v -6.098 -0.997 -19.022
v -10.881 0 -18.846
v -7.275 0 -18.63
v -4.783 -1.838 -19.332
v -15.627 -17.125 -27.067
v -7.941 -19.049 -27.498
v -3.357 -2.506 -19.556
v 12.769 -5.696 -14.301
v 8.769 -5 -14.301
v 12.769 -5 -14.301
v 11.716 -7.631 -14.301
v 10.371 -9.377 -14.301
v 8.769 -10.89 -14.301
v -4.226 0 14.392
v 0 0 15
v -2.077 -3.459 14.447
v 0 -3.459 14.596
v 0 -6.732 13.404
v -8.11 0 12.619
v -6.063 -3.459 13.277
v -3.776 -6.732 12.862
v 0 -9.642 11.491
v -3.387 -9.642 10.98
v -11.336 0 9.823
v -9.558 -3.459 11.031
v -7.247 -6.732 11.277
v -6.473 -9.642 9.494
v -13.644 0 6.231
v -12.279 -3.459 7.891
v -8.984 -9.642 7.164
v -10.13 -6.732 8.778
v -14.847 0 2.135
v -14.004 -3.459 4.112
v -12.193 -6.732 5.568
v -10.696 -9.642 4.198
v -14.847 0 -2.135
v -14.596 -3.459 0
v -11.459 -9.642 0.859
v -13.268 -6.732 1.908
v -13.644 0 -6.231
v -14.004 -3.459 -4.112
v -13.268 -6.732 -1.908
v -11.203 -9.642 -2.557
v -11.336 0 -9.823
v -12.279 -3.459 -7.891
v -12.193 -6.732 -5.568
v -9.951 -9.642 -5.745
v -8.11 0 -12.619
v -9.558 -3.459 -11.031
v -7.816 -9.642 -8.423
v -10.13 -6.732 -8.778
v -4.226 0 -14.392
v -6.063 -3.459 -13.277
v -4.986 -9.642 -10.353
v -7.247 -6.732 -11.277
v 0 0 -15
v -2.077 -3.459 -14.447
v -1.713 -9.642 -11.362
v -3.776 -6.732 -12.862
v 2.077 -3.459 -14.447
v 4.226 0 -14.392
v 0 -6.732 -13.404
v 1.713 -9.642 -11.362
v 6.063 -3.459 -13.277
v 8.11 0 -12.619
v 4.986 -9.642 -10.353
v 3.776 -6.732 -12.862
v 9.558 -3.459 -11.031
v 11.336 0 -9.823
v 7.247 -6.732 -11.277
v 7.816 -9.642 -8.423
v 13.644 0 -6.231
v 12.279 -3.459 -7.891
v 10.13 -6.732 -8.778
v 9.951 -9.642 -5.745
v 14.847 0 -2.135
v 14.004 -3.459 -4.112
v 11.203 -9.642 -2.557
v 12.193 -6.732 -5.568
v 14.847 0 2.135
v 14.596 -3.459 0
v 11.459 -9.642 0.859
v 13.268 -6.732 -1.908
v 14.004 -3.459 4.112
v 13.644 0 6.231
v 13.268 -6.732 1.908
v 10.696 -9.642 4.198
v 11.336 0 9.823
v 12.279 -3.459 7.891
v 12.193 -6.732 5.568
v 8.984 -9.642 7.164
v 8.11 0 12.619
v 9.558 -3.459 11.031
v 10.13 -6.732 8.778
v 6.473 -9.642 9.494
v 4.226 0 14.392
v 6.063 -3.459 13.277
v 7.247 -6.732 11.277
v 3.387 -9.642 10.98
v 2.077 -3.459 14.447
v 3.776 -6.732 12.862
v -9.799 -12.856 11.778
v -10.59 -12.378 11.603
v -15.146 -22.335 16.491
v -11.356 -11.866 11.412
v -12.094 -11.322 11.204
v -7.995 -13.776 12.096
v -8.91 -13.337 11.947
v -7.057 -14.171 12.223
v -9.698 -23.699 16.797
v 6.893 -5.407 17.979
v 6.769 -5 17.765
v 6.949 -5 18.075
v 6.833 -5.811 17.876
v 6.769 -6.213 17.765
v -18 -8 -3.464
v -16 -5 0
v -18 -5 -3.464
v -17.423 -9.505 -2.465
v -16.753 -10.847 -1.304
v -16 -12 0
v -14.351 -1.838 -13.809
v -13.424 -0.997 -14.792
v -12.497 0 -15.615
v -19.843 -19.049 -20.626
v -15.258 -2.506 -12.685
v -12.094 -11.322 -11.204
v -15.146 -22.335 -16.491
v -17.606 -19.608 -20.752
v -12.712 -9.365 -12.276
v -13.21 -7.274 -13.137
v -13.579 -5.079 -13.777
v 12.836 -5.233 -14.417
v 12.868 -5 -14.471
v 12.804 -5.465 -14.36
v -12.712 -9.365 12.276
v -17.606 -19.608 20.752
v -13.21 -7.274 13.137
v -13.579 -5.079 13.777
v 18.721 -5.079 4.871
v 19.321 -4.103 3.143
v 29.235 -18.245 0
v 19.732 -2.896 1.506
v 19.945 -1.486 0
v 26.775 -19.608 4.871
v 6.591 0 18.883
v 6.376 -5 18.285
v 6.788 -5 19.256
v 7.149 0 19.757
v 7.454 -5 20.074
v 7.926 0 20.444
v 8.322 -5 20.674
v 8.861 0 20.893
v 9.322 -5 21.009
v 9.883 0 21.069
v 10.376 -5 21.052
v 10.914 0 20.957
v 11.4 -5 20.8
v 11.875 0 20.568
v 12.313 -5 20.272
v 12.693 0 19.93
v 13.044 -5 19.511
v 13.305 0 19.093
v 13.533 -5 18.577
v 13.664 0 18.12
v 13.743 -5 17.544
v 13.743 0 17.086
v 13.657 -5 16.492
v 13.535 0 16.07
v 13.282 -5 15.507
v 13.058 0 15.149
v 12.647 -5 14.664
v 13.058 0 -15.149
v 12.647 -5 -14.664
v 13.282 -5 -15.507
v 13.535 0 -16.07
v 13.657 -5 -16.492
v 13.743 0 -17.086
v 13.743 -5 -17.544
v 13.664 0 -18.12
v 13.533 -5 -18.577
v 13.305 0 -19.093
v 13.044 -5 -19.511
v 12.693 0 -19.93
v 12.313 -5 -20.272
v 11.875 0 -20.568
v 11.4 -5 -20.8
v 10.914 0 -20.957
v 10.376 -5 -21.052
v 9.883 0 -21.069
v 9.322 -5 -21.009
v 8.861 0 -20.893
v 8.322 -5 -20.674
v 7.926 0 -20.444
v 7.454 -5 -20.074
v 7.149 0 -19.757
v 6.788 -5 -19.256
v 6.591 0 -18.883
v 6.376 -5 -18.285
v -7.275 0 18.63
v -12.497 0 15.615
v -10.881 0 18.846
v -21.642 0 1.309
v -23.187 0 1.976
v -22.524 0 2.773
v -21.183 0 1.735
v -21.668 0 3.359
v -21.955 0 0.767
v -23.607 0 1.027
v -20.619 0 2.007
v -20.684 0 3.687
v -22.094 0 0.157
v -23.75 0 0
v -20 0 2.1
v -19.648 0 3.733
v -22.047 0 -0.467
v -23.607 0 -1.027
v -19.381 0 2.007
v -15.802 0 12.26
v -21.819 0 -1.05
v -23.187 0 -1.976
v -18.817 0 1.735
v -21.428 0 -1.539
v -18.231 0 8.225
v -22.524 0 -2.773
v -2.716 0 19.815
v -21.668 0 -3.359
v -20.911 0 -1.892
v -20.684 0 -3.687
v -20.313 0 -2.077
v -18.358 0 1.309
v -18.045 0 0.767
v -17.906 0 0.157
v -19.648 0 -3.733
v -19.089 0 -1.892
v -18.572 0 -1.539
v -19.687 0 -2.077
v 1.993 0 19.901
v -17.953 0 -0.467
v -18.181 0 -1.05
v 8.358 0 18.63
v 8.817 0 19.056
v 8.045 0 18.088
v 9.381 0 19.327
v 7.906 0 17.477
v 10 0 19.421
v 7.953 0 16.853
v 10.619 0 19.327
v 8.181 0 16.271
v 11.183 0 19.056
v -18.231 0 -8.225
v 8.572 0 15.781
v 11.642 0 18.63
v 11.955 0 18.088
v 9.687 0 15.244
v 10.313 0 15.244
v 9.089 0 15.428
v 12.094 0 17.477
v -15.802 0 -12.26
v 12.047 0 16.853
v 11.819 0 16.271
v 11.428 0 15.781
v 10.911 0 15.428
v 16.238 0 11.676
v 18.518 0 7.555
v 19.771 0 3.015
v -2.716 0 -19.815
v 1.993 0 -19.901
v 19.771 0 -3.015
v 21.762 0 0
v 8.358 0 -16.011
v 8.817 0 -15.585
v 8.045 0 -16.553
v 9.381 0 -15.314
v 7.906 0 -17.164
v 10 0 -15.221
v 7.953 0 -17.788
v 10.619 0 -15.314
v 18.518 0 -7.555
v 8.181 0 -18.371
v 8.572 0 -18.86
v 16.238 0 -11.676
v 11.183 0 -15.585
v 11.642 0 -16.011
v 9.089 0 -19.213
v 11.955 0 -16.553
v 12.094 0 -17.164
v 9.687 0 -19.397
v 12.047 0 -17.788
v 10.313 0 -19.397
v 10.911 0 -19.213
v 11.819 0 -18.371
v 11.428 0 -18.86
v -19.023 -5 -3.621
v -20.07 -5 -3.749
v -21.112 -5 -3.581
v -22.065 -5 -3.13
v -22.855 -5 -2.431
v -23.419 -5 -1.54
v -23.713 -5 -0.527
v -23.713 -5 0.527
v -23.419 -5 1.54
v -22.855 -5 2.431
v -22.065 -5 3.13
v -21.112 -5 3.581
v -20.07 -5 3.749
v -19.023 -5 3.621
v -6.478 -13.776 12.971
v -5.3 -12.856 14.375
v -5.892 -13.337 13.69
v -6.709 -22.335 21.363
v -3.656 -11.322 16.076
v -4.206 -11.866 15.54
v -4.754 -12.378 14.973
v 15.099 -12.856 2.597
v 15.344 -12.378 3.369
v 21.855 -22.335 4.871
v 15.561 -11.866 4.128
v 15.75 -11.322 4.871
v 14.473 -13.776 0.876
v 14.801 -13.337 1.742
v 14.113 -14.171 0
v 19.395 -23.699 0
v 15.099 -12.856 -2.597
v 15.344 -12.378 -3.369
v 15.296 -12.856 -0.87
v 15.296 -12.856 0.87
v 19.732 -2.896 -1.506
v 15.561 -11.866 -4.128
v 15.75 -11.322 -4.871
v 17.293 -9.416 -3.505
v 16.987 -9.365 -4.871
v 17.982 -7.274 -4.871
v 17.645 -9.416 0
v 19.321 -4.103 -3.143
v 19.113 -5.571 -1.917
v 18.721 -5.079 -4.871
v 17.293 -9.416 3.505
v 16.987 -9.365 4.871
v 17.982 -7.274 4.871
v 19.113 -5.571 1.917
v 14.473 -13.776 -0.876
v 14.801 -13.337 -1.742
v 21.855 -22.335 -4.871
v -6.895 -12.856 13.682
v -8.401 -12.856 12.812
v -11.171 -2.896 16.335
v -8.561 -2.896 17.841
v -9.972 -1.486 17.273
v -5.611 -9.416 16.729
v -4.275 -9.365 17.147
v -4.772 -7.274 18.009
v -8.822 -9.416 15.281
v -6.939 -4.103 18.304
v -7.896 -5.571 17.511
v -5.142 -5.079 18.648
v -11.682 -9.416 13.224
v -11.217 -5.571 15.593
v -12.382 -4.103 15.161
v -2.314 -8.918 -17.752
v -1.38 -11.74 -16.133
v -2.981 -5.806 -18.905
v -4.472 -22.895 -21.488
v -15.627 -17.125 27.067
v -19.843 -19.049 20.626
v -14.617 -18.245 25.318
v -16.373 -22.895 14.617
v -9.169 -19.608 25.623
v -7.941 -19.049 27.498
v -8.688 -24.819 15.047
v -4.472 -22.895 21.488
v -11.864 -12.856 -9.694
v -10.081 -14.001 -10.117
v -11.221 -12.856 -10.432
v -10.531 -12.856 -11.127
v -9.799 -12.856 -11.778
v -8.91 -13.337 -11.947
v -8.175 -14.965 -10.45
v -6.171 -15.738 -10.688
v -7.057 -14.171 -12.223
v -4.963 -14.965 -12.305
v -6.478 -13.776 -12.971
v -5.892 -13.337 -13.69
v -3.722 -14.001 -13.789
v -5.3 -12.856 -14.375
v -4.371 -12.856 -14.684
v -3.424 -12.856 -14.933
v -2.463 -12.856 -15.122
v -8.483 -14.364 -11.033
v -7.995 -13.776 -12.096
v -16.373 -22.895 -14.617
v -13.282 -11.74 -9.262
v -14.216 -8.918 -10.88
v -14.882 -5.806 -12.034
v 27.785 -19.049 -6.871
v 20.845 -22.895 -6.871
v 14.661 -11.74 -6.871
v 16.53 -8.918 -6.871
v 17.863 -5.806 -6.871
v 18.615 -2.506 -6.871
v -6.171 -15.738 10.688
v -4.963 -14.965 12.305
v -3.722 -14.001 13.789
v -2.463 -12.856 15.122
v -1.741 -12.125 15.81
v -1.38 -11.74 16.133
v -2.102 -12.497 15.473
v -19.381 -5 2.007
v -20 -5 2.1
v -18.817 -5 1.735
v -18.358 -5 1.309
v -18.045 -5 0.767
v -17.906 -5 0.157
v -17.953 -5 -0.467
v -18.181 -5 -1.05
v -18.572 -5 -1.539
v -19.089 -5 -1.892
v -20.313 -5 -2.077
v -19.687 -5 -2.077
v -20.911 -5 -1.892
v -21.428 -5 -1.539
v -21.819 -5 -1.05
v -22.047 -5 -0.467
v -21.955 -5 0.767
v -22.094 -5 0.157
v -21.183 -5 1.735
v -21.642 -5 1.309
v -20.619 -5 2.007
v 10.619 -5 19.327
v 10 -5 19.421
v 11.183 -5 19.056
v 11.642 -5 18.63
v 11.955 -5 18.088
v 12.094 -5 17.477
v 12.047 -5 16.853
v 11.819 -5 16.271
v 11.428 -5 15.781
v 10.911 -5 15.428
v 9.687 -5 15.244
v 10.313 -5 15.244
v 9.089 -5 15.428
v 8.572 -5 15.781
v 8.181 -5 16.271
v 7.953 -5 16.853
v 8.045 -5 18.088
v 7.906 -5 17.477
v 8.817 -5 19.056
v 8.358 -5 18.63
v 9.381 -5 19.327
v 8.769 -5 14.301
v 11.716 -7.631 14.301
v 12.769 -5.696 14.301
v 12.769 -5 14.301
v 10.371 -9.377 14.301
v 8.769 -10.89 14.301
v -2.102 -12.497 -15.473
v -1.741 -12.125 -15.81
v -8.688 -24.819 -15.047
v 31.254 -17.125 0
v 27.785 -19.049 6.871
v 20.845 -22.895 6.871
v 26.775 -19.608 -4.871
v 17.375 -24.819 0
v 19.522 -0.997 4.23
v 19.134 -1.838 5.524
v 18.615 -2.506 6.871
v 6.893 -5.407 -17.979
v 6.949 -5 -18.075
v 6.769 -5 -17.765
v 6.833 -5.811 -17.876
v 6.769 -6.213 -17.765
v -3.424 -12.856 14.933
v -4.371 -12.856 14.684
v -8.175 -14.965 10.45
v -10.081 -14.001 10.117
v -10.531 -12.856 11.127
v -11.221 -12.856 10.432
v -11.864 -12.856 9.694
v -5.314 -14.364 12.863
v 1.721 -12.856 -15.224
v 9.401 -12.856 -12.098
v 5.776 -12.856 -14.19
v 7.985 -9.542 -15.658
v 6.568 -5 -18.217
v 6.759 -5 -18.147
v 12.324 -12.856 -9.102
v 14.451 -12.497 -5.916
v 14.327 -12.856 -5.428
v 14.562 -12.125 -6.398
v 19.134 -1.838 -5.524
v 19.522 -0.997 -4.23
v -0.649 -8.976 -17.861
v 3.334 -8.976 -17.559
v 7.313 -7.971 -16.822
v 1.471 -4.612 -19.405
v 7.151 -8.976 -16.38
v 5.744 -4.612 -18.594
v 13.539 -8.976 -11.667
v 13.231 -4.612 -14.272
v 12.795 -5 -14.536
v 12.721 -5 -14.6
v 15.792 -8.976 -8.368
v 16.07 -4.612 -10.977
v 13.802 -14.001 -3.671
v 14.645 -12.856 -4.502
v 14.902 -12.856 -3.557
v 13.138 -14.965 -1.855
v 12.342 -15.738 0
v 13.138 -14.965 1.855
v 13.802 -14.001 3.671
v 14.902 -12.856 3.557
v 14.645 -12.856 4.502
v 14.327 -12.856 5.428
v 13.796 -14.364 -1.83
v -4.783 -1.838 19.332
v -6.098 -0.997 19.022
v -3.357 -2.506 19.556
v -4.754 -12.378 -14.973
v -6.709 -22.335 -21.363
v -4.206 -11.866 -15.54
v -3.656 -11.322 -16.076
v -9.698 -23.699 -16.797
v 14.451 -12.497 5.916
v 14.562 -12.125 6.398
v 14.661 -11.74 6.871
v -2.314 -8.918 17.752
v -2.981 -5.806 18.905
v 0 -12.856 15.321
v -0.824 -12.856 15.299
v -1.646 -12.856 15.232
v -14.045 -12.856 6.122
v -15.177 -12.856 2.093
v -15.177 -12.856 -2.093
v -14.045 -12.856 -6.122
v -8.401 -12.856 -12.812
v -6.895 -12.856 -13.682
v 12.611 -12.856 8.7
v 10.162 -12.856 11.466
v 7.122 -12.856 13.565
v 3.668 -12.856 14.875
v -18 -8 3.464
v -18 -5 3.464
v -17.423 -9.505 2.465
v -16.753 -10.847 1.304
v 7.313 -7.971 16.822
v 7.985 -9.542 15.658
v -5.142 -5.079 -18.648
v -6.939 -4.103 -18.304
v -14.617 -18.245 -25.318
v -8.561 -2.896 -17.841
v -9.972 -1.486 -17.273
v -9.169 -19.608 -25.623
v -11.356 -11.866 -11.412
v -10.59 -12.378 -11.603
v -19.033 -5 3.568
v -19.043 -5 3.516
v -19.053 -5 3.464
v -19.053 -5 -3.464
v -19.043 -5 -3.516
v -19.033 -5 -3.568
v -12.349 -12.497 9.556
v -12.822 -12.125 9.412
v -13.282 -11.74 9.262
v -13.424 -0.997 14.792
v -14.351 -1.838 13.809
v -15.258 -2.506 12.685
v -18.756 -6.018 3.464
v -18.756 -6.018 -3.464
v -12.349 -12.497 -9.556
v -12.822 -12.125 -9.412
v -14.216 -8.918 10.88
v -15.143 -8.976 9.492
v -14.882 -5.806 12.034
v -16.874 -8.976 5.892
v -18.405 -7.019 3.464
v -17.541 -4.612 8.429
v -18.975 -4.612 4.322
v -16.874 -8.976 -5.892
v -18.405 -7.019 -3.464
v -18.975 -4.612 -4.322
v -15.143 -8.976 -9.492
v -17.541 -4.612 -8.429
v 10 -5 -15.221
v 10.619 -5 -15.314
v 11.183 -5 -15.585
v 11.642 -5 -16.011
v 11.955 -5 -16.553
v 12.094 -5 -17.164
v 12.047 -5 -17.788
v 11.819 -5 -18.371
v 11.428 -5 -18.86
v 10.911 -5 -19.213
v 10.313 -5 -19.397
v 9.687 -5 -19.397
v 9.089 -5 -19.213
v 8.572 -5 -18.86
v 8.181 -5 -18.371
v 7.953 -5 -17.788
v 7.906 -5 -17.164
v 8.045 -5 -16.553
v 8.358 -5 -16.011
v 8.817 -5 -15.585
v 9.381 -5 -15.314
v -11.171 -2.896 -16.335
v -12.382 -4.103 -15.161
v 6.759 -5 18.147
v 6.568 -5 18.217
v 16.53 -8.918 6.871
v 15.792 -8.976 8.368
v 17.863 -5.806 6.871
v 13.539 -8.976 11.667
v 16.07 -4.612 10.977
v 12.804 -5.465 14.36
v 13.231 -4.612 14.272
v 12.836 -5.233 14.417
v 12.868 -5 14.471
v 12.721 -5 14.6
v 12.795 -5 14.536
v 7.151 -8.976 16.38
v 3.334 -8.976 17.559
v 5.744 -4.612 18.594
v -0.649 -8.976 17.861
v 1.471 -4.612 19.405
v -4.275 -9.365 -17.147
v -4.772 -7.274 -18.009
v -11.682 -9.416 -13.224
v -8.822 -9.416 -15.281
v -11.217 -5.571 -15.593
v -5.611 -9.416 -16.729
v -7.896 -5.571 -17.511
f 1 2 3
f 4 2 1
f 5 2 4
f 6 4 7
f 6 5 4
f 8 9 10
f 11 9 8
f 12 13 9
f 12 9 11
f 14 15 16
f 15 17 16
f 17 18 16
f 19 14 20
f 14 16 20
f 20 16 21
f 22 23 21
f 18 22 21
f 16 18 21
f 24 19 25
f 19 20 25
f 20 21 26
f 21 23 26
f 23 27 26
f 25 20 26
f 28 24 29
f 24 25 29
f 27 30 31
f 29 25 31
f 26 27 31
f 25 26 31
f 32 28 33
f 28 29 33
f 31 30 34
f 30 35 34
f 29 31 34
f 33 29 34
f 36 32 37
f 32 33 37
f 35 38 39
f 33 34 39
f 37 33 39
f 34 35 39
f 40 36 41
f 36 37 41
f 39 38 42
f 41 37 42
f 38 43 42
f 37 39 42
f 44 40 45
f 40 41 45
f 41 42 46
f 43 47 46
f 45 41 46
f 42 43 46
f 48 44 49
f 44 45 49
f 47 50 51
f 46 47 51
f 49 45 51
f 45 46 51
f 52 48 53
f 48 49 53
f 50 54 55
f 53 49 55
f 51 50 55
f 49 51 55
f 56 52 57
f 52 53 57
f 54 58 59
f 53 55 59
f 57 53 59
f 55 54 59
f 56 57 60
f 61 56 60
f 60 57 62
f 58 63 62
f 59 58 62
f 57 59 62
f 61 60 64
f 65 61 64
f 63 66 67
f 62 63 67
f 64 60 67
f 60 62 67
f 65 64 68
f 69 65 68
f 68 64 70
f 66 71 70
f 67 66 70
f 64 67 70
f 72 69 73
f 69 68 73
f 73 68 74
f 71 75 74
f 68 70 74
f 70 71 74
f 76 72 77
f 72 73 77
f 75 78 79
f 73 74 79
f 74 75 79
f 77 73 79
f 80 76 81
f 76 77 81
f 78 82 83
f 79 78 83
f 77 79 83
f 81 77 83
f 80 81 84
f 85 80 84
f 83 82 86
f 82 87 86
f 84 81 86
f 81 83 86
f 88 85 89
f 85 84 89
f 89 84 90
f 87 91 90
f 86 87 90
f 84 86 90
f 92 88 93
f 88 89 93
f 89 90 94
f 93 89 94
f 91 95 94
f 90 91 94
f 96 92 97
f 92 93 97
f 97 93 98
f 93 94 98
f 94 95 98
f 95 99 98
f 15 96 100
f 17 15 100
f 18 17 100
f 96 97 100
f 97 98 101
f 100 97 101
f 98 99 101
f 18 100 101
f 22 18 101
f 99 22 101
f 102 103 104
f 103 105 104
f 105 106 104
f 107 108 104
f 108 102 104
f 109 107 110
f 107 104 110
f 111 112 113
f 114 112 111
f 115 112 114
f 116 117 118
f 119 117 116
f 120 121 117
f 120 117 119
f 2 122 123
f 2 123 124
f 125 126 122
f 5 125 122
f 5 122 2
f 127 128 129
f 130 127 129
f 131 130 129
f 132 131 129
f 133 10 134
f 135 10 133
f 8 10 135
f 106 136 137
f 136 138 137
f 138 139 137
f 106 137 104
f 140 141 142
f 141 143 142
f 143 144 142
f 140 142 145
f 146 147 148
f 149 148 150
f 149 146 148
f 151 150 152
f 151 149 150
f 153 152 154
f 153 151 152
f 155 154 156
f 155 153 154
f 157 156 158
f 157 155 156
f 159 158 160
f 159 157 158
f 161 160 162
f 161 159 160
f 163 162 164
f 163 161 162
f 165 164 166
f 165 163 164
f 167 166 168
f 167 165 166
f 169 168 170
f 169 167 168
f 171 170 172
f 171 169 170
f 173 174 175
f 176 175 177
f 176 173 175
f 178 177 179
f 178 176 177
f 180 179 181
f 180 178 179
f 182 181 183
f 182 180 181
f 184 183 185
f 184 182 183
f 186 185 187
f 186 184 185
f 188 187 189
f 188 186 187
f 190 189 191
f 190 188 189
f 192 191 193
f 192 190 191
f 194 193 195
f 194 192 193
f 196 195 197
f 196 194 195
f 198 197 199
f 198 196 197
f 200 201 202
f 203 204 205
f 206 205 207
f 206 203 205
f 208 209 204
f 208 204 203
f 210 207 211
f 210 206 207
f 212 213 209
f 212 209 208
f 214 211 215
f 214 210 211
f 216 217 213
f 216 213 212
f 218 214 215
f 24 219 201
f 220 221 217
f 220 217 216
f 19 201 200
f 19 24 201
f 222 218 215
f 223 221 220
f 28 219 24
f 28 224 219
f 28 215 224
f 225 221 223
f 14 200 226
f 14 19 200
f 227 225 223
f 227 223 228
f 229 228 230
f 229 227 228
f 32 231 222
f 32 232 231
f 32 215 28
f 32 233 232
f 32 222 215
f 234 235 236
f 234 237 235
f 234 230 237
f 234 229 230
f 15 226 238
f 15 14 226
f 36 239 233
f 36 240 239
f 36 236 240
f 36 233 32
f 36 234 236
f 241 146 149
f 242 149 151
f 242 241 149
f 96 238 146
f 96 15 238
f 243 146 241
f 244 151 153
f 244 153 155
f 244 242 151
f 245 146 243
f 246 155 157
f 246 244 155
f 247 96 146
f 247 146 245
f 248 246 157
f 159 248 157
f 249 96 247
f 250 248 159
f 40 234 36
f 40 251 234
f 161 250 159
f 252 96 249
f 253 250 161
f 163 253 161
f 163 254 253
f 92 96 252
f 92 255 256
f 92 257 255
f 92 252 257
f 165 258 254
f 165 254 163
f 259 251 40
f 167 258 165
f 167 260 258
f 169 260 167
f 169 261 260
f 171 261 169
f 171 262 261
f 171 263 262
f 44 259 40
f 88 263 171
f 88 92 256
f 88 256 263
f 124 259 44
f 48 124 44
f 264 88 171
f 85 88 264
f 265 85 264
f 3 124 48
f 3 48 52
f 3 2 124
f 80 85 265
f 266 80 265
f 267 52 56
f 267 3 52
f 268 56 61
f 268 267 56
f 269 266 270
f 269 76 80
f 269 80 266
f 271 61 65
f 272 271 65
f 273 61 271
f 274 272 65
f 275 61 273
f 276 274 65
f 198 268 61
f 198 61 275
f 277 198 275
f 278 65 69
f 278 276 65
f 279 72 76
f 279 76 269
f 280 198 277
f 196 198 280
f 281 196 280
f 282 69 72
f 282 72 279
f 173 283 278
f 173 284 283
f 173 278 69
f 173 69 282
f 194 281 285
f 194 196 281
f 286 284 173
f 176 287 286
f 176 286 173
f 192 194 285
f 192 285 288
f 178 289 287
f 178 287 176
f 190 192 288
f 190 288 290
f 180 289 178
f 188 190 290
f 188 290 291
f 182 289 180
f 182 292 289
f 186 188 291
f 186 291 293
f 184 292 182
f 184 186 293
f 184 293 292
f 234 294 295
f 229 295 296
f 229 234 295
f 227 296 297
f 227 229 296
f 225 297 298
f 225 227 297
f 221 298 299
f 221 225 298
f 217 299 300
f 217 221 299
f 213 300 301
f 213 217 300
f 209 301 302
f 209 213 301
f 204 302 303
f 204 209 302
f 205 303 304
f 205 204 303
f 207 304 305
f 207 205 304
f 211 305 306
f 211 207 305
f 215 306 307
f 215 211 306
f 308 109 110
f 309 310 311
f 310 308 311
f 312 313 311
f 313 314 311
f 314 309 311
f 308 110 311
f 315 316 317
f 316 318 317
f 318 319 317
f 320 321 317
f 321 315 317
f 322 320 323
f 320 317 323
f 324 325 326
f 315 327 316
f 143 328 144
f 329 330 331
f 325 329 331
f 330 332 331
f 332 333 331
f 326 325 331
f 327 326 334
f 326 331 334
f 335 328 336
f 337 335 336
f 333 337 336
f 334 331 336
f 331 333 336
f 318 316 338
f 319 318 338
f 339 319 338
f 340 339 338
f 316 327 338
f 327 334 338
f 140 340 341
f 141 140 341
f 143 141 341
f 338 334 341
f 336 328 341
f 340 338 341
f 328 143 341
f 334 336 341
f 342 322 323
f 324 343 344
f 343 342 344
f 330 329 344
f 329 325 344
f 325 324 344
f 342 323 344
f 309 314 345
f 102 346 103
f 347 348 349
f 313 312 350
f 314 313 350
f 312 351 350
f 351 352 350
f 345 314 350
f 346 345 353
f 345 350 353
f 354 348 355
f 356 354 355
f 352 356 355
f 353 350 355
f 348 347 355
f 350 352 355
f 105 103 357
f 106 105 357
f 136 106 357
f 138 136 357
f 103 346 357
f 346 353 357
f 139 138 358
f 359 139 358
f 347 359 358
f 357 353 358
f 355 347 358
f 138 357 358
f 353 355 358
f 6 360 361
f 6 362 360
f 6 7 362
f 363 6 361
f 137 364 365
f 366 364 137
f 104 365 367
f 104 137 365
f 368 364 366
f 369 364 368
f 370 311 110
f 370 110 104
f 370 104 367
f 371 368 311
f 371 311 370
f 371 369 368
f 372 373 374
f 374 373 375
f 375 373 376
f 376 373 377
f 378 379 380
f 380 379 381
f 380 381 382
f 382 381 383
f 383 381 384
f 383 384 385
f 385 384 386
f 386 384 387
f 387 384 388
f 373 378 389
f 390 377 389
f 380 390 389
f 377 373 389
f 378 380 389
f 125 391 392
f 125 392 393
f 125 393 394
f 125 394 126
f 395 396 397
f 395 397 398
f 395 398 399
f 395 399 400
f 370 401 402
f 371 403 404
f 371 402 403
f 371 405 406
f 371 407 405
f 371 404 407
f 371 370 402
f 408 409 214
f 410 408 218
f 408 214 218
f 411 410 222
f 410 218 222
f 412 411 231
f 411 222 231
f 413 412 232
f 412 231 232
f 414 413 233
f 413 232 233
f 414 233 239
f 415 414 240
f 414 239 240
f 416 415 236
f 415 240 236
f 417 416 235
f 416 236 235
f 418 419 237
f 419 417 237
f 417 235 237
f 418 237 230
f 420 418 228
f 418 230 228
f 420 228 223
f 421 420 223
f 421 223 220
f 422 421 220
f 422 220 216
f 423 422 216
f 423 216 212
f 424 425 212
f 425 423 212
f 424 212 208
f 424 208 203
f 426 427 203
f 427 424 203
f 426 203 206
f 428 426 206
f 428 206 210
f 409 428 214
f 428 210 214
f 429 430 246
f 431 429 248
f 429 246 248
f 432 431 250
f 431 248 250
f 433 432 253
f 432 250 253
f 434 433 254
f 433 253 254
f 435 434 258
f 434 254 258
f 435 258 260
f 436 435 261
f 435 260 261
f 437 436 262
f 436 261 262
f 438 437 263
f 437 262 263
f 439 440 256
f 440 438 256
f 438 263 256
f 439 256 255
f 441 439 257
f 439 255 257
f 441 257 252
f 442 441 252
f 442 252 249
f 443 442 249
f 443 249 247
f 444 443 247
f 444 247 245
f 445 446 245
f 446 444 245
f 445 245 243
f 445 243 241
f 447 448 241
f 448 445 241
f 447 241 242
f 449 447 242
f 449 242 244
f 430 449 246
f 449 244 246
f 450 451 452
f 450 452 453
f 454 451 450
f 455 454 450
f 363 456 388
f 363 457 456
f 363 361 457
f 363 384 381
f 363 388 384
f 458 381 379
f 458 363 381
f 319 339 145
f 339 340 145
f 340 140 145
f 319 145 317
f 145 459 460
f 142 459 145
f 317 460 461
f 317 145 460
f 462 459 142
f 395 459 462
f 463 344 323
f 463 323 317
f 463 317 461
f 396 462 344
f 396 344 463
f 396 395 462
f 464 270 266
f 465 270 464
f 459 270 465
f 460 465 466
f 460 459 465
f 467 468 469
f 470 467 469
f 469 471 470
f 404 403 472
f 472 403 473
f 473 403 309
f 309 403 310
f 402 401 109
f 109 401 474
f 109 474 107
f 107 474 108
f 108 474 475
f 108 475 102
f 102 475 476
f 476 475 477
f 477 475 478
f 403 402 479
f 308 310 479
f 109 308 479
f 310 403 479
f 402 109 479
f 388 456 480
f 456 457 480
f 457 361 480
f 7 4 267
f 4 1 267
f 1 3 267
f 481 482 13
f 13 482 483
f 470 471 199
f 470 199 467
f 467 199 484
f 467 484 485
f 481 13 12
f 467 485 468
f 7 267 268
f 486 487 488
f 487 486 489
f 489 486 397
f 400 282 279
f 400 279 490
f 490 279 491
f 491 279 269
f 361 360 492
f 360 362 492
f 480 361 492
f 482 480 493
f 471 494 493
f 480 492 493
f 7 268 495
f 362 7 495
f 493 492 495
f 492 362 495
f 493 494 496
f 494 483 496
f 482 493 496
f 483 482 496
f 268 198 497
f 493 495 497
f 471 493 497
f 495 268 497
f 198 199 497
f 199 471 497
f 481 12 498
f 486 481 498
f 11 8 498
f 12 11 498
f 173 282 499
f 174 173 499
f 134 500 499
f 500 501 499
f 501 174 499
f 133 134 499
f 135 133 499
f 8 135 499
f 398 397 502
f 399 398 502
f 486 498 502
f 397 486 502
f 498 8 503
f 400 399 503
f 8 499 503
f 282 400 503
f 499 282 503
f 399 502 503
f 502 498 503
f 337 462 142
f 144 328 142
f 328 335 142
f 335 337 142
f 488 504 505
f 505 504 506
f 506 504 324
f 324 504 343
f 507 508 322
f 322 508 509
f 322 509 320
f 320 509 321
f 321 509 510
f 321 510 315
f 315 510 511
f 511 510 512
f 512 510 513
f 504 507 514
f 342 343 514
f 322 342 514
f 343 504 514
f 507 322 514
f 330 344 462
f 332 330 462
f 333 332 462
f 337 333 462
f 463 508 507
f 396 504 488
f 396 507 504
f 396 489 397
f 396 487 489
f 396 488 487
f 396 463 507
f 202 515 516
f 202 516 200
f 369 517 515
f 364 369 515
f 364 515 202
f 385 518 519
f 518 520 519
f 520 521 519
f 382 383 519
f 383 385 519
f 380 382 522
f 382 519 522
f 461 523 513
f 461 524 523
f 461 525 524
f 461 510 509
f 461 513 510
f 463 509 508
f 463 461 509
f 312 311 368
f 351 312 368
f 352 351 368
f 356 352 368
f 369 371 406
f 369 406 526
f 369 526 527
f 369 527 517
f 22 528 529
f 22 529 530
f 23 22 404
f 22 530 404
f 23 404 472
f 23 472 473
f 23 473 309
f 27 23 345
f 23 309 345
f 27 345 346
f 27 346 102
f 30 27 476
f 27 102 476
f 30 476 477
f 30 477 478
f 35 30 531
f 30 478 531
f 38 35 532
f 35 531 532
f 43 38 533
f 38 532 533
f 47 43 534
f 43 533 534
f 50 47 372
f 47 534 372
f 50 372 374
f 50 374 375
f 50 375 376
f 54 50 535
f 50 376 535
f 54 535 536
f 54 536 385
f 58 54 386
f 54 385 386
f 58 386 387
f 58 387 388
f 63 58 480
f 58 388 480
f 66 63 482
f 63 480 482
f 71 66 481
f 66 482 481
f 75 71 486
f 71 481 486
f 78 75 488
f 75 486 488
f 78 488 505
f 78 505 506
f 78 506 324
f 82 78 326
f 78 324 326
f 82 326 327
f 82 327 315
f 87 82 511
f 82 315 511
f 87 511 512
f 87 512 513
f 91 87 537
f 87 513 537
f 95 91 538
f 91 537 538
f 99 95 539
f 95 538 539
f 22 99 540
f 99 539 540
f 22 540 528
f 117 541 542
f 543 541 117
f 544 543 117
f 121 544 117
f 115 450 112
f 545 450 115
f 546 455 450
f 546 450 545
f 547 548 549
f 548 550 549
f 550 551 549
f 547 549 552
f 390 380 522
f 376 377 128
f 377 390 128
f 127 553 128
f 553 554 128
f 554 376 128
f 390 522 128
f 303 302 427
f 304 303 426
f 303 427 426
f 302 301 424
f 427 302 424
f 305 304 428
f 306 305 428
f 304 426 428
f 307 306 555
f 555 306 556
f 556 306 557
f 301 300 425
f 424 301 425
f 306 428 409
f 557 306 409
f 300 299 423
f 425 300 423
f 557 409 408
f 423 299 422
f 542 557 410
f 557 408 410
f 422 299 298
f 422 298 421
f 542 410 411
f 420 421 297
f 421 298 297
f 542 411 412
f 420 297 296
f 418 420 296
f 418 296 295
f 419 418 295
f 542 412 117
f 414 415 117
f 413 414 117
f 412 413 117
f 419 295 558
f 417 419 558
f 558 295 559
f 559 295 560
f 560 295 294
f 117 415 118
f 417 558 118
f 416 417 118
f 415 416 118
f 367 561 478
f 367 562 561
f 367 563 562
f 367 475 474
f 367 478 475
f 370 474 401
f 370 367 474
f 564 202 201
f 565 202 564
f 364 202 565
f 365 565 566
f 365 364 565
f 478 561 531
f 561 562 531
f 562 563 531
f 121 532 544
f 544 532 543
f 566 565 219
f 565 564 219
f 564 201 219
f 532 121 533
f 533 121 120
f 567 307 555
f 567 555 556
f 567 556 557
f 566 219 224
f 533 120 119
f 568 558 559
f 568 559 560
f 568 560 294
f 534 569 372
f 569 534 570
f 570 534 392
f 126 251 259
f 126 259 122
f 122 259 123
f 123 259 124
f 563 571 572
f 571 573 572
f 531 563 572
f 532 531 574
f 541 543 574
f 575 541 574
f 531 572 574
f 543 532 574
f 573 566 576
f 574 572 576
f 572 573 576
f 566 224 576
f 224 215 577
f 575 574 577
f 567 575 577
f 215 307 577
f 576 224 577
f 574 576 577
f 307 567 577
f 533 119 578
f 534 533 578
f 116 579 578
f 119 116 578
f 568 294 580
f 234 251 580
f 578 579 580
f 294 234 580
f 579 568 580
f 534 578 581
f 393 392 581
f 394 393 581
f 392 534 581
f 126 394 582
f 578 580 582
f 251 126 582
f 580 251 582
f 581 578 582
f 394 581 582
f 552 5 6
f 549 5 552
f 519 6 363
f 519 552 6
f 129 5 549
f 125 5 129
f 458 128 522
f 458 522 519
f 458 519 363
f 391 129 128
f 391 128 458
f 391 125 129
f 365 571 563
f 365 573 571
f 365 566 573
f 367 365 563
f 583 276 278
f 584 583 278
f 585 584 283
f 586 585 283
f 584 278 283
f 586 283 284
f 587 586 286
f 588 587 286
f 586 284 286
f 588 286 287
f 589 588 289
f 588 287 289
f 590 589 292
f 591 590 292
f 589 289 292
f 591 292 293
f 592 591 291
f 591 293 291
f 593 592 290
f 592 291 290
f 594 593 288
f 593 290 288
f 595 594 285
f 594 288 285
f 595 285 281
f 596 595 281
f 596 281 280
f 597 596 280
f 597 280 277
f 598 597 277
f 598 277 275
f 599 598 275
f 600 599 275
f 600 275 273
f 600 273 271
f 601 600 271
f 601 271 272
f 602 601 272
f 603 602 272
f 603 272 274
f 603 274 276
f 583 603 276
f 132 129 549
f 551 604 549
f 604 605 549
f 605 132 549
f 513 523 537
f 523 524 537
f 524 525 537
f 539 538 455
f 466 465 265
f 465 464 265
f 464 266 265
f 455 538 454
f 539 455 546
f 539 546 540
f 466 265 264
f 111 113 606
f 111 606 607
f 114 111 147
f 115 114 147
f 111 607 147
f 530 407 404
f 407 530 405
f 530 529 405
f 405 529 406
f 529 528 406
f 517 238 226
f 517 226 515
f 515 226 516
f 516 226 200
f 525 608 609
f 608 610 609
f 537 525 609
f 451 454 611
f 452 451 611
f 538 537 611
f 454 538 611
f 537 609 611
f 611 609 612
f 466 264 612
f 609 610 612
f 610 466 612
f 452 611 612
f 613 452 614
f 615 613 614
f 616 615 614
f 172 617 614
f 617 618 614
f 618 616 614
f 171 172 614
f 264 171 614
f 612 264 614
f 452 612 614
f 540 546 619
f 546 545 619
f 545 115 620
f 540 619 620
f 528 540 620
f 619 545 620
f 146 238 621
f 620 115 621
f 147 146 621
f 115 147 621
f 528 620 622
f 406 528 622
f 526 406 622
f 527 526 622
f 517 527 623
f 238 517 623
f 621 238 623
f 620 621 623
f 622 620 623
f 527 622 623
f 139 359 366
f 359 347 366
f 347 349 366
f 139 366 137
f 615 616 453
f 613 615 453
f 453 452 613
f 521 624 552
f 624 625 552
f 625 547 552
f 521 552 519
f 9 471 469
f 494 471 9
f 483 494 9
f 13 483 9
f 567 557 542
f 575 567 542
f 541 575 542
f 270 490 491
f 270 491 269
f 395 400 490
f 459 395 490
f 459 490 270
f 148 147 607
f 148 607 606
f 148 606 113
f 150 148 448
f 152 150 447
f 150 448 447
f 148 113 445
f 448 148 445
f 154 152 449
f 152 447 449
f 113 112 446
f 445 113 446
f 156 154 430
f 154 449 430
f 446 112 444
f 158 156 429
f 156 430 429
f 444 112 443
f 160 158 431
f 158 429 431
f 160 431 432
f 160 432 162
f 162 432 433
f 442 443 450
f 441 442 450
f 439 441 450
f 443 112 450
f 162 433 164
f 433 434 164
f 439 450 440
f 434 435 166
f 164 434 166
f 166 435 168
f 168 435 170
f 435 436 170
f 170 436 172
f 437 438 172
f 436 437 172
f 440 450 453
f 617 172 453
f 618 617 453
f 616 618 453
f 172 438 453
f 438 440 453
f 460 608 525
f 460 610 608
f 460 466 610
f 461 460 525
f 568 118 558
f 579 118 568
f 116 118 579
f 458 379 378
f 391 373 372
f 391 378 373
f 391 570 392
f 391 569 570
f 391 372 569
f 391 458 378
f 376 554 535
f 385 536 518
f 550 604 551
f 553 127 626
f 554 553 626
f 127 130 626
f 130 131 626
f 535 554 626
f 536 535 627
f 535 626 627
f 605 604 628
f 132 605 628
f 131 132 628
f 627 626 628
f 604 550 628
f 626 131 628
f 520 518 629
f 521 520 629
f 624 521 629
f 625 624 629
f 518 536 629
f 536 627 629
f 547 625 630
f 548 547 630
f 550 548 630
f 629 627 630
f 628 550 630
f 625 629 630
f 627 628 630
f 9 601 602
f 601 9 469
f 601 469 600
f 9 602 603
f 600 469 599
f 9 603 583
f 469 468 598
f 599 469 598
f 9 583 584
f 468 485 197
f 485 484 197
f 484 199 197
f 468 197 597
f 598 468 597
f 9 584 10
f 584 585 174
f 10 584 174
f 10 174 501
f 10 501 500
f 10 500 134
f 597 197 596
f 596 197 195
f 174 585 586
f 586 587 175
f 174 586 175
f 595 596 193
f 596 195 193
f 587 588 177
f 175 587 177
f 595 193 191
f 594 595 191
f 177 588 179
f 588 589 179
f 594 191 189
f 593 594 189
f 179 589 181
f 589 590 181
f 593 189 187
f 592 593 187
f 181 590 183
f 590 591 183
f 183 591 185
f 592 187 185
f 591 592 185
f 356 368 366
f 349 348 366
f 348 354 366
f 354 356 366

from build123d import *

# Parameters (mm, degrees)
IZIM4_R                          = 3.75
IZIM4_R_2                        = 1.75
Y_KSEKLIK_EKSTR_ZYON1_DEPTH      = 5
IZIM5_R                          = 2.1
KES_EKSTR_ZYON1_DEPTH            = 24
KES_EKSTR_ZYON2_DEPTH            = 36.170331308
Y_KSEKLIK_EKSTR_ZYON2_REACH      = 67.295
Y_KSEKLIK_EKSTR_ZYON2_END_RADIUS = 20
Y_KSEKLIK_EKSTR_ZYON2_START      = -5
DAIRESEL_KAPLAMA1_COUNT          = 3
KES_EKSTR_ZYON3_DEPTH            = 45
KES_EKSTR_ZYON3_DEPTH_BACK       = 39
IZIM10_W                         = 61.268894521
IZIM10_H                         = 17.891205564


with BuildPart() as part:
    # Çizim3 → Döndür1 (revolve)
    with BuildSketch(Plane.XY, mode=Mode.PRIVATE) as d_nd_r1_sk:
        with BuildLine():
            Line((-11.490666647, -9.641814145), (-15.320888862, -12.855752194))
            ThreePointArc((-15.320888862, -12.855752194), (-18.793852416, -6.840402867), (-20, 0))
            Line((-20, 0), (-15, 0))
            ThreePointArc((-15, 0), (-14.095389312, -5.13030215), (-11.490666647, -9.641814145))
        make_face()
    revolve(d_nd_r1_sk.sketch.rotate(Axis((0, 24.311963794, 0), (0, -1, 0)), 270), axis=Axis((0, 24.311963794, 0), (0, -1, 0)))

    # Çizim4 → Yükseklik-Ekstrüzyon1 (add)
    # profile 1 of 3: a face of its own
    with BuildSketch(Plane(origin=(0, 0, 0), x_dir=(1, 0, 0), z_dir=(0, 1, 0))):
        with Locations((10, 17.320508076)):
            Circle(IZIM4_R)
        with Locations((10, 17.320508076)):
            Circle(IZIM4_R_2, mode=Mode.SUBTRACT)
    # profile 2 of 3: a face of its own
    with BuildSketch(Plane(origin=(0, 0, 0), x_dir=(1, 0, 0), z_dir=(0, 1, 0))):
        with Locations((-20, 0)):
            Circle(IZIM4_R)
        with Locations((-20, 0)):
            Circle(IZIM4_R_2, mode=Mode.SUBTRACT)
    # profile 3 of 3: a face of its own
    with BuildSketch(Plane(origin=(0, 0, 0), x_dir=(1, 0, 0), z_dir=(0, 1, 0))):
        with Locations((10, -17.320508076)):
            Circle(IZIM4_R)
        with Locations((10, -17.320508076)):
            Circle(IZIM4_R_2, mode=Mode.SUBTRACT)
    extrude(amount=-Y_KSEKLIK_EKSTR_ZYON1_DEPTH)

    # Çizim5 → Kes-Ekstrüzyon1 (cut)
    with BuildSketch(Plane(origin=(0, 0, 0), x_dir=(1, 0, 0), z_dir=(0, 1, 0))):
        with Locations(Location((10, 17.320508076, 0), (0, 0, 270))):
            Circle(IZIM5_R)
        with Locations(Location((-20, 0, 0), (0, 0, 270))):
            Circle(IZIM5_R)
        with Locations(Location((10, -17.320508076, 0), (0, 0, 270))):
            Circle(IZIM5_R)
    extrude(amount=-KES_EKSTR_ZYON1_DEPTH, mode=Mode.SUBTRACT)

    # Çizim6 → Kes-Ekstrüzyon2 (cut)
    with BuildSketch(Plane(origin=(0, -41.170331308, 0), x_dir=(1, 0, 0), z_dir=(0, 1, 0))):
        Polygon((-16, 0), (-18, 3.464101615), (-22, 3.464101615), (-24, 0), (-22, -3.464101615), (-18, -3.464101615), align=None)
        Polygon((8.769230769, 14.300522052), (12.769230769, 14.300522052), (14.769230769, 17.764623667), (12.769230769, 21.228725283), (8.769230769, 21.228725283), (6.769230769, 17.764623667), align=None)
        Polygon((8.769230769, -14.300522052), (6.769230769, -17.764623667), (8.769230769, -21.228725283), (12.769230769, -21.228725283), (14.769230769, -17.764623667), (12.769230769, -14.300522052), align=None)
    extrude(amount=KES_EKSTR_ZYON2_DEPTH, mode=Mode.SUBTRACT)

    # Yükseklik-Ekstrüzyon2: up to this sphere (the profile starts outside it)
    y_kseklik_ekstr_zyon2_end = Location((0, 0, 0)) * Sphere(Y_KSEKLIK_EKSTR_ZYON2_END_RADIUS, mode=Mode.PRIVATE)
    # Çizim9 → Yükseklik-Ekstrüzyon2 (add, up to the surface)
    with BuildSketch(Plane(origin=(26.738833579, -25.345051489, 0), x_dir=(-0.8746197071393953, -0.48480962024633817, 0), z_dir=(0.48480962024633817, -0.8746197071393953, 0)).offset(Y_KSEKLIK_EKSTR_ZYON2_START), mode=Mode.PRIVATE) as y_kseklik_ekstr_zyon2_sk1:
        Polygon((3.967200538, 6.871392896), (-3.967200538, 6.871392896), (-7.934401077, 0), (-3.967200538, -6.871392896), (3.967200538, -6.871392896), (7.934401077, 0), align=None)
        Polygon((5.625, 0), (2.8125, 4.871392896), (-2.8125, 4.871392896), (-5.625, 0), (-2.8125, -4.871392896), (2.8125, -4.871392896), align=None, mode=Mode.SUBTRACT)
    y_kseklik_ekstr_zyon2_tool1 = extrude(y_kseklik_ekstr_zyon2_sk1.sketch, amount=-Y_KSEKLIK_EKSTR_ZYON2_REACH, mode=Mode.PRIVATE) - y_kseklik_ekstr_zyon2_end
    y_kseklik_ekstr_zyon2 = y_kseklik_ekstr_zyon2_tool1.solids().sort_by_distance((24.314785, -20.971953, -6.661468))[0]
    add(y_kseklik_ekstr_zyon2)

    # Dairesel Kaplama1: Yükseklik-Ekstrüzyon2 ×3 about axis
    dairesel_kaplama1_axis = Axis((0, 0, 0), (0, 1, 0))
    for i in range(1, DAIRESEL_KAPLAMA1_COUNT):
        add(y_kseklik_ekstr_zyon2.rotate(dairesel_kaplama1_axis, i * 360 / DAIRESEL_KAPLAMA1_COUNT))

    # Çizim10 → Kes-Ekstrüzyon3 (cut, two sides: drawn at the far end of the back side and taken through both)
    with BuildSketch(Plane.XY.offset(-KES_EKSTR_ZYON3_DEPTH_BACK)):
        with Locations((5.148097131, 8.945602782)):
            Rectangle(IZIM10_W, IZIM10_H)
    extrude(amount=KES_EKSTR_ZYON3_DEPTH + KES_EKSTR_ZYON3_DEPTH_BACK, mode=Mode.SUBTRACT)


solid = part.part
